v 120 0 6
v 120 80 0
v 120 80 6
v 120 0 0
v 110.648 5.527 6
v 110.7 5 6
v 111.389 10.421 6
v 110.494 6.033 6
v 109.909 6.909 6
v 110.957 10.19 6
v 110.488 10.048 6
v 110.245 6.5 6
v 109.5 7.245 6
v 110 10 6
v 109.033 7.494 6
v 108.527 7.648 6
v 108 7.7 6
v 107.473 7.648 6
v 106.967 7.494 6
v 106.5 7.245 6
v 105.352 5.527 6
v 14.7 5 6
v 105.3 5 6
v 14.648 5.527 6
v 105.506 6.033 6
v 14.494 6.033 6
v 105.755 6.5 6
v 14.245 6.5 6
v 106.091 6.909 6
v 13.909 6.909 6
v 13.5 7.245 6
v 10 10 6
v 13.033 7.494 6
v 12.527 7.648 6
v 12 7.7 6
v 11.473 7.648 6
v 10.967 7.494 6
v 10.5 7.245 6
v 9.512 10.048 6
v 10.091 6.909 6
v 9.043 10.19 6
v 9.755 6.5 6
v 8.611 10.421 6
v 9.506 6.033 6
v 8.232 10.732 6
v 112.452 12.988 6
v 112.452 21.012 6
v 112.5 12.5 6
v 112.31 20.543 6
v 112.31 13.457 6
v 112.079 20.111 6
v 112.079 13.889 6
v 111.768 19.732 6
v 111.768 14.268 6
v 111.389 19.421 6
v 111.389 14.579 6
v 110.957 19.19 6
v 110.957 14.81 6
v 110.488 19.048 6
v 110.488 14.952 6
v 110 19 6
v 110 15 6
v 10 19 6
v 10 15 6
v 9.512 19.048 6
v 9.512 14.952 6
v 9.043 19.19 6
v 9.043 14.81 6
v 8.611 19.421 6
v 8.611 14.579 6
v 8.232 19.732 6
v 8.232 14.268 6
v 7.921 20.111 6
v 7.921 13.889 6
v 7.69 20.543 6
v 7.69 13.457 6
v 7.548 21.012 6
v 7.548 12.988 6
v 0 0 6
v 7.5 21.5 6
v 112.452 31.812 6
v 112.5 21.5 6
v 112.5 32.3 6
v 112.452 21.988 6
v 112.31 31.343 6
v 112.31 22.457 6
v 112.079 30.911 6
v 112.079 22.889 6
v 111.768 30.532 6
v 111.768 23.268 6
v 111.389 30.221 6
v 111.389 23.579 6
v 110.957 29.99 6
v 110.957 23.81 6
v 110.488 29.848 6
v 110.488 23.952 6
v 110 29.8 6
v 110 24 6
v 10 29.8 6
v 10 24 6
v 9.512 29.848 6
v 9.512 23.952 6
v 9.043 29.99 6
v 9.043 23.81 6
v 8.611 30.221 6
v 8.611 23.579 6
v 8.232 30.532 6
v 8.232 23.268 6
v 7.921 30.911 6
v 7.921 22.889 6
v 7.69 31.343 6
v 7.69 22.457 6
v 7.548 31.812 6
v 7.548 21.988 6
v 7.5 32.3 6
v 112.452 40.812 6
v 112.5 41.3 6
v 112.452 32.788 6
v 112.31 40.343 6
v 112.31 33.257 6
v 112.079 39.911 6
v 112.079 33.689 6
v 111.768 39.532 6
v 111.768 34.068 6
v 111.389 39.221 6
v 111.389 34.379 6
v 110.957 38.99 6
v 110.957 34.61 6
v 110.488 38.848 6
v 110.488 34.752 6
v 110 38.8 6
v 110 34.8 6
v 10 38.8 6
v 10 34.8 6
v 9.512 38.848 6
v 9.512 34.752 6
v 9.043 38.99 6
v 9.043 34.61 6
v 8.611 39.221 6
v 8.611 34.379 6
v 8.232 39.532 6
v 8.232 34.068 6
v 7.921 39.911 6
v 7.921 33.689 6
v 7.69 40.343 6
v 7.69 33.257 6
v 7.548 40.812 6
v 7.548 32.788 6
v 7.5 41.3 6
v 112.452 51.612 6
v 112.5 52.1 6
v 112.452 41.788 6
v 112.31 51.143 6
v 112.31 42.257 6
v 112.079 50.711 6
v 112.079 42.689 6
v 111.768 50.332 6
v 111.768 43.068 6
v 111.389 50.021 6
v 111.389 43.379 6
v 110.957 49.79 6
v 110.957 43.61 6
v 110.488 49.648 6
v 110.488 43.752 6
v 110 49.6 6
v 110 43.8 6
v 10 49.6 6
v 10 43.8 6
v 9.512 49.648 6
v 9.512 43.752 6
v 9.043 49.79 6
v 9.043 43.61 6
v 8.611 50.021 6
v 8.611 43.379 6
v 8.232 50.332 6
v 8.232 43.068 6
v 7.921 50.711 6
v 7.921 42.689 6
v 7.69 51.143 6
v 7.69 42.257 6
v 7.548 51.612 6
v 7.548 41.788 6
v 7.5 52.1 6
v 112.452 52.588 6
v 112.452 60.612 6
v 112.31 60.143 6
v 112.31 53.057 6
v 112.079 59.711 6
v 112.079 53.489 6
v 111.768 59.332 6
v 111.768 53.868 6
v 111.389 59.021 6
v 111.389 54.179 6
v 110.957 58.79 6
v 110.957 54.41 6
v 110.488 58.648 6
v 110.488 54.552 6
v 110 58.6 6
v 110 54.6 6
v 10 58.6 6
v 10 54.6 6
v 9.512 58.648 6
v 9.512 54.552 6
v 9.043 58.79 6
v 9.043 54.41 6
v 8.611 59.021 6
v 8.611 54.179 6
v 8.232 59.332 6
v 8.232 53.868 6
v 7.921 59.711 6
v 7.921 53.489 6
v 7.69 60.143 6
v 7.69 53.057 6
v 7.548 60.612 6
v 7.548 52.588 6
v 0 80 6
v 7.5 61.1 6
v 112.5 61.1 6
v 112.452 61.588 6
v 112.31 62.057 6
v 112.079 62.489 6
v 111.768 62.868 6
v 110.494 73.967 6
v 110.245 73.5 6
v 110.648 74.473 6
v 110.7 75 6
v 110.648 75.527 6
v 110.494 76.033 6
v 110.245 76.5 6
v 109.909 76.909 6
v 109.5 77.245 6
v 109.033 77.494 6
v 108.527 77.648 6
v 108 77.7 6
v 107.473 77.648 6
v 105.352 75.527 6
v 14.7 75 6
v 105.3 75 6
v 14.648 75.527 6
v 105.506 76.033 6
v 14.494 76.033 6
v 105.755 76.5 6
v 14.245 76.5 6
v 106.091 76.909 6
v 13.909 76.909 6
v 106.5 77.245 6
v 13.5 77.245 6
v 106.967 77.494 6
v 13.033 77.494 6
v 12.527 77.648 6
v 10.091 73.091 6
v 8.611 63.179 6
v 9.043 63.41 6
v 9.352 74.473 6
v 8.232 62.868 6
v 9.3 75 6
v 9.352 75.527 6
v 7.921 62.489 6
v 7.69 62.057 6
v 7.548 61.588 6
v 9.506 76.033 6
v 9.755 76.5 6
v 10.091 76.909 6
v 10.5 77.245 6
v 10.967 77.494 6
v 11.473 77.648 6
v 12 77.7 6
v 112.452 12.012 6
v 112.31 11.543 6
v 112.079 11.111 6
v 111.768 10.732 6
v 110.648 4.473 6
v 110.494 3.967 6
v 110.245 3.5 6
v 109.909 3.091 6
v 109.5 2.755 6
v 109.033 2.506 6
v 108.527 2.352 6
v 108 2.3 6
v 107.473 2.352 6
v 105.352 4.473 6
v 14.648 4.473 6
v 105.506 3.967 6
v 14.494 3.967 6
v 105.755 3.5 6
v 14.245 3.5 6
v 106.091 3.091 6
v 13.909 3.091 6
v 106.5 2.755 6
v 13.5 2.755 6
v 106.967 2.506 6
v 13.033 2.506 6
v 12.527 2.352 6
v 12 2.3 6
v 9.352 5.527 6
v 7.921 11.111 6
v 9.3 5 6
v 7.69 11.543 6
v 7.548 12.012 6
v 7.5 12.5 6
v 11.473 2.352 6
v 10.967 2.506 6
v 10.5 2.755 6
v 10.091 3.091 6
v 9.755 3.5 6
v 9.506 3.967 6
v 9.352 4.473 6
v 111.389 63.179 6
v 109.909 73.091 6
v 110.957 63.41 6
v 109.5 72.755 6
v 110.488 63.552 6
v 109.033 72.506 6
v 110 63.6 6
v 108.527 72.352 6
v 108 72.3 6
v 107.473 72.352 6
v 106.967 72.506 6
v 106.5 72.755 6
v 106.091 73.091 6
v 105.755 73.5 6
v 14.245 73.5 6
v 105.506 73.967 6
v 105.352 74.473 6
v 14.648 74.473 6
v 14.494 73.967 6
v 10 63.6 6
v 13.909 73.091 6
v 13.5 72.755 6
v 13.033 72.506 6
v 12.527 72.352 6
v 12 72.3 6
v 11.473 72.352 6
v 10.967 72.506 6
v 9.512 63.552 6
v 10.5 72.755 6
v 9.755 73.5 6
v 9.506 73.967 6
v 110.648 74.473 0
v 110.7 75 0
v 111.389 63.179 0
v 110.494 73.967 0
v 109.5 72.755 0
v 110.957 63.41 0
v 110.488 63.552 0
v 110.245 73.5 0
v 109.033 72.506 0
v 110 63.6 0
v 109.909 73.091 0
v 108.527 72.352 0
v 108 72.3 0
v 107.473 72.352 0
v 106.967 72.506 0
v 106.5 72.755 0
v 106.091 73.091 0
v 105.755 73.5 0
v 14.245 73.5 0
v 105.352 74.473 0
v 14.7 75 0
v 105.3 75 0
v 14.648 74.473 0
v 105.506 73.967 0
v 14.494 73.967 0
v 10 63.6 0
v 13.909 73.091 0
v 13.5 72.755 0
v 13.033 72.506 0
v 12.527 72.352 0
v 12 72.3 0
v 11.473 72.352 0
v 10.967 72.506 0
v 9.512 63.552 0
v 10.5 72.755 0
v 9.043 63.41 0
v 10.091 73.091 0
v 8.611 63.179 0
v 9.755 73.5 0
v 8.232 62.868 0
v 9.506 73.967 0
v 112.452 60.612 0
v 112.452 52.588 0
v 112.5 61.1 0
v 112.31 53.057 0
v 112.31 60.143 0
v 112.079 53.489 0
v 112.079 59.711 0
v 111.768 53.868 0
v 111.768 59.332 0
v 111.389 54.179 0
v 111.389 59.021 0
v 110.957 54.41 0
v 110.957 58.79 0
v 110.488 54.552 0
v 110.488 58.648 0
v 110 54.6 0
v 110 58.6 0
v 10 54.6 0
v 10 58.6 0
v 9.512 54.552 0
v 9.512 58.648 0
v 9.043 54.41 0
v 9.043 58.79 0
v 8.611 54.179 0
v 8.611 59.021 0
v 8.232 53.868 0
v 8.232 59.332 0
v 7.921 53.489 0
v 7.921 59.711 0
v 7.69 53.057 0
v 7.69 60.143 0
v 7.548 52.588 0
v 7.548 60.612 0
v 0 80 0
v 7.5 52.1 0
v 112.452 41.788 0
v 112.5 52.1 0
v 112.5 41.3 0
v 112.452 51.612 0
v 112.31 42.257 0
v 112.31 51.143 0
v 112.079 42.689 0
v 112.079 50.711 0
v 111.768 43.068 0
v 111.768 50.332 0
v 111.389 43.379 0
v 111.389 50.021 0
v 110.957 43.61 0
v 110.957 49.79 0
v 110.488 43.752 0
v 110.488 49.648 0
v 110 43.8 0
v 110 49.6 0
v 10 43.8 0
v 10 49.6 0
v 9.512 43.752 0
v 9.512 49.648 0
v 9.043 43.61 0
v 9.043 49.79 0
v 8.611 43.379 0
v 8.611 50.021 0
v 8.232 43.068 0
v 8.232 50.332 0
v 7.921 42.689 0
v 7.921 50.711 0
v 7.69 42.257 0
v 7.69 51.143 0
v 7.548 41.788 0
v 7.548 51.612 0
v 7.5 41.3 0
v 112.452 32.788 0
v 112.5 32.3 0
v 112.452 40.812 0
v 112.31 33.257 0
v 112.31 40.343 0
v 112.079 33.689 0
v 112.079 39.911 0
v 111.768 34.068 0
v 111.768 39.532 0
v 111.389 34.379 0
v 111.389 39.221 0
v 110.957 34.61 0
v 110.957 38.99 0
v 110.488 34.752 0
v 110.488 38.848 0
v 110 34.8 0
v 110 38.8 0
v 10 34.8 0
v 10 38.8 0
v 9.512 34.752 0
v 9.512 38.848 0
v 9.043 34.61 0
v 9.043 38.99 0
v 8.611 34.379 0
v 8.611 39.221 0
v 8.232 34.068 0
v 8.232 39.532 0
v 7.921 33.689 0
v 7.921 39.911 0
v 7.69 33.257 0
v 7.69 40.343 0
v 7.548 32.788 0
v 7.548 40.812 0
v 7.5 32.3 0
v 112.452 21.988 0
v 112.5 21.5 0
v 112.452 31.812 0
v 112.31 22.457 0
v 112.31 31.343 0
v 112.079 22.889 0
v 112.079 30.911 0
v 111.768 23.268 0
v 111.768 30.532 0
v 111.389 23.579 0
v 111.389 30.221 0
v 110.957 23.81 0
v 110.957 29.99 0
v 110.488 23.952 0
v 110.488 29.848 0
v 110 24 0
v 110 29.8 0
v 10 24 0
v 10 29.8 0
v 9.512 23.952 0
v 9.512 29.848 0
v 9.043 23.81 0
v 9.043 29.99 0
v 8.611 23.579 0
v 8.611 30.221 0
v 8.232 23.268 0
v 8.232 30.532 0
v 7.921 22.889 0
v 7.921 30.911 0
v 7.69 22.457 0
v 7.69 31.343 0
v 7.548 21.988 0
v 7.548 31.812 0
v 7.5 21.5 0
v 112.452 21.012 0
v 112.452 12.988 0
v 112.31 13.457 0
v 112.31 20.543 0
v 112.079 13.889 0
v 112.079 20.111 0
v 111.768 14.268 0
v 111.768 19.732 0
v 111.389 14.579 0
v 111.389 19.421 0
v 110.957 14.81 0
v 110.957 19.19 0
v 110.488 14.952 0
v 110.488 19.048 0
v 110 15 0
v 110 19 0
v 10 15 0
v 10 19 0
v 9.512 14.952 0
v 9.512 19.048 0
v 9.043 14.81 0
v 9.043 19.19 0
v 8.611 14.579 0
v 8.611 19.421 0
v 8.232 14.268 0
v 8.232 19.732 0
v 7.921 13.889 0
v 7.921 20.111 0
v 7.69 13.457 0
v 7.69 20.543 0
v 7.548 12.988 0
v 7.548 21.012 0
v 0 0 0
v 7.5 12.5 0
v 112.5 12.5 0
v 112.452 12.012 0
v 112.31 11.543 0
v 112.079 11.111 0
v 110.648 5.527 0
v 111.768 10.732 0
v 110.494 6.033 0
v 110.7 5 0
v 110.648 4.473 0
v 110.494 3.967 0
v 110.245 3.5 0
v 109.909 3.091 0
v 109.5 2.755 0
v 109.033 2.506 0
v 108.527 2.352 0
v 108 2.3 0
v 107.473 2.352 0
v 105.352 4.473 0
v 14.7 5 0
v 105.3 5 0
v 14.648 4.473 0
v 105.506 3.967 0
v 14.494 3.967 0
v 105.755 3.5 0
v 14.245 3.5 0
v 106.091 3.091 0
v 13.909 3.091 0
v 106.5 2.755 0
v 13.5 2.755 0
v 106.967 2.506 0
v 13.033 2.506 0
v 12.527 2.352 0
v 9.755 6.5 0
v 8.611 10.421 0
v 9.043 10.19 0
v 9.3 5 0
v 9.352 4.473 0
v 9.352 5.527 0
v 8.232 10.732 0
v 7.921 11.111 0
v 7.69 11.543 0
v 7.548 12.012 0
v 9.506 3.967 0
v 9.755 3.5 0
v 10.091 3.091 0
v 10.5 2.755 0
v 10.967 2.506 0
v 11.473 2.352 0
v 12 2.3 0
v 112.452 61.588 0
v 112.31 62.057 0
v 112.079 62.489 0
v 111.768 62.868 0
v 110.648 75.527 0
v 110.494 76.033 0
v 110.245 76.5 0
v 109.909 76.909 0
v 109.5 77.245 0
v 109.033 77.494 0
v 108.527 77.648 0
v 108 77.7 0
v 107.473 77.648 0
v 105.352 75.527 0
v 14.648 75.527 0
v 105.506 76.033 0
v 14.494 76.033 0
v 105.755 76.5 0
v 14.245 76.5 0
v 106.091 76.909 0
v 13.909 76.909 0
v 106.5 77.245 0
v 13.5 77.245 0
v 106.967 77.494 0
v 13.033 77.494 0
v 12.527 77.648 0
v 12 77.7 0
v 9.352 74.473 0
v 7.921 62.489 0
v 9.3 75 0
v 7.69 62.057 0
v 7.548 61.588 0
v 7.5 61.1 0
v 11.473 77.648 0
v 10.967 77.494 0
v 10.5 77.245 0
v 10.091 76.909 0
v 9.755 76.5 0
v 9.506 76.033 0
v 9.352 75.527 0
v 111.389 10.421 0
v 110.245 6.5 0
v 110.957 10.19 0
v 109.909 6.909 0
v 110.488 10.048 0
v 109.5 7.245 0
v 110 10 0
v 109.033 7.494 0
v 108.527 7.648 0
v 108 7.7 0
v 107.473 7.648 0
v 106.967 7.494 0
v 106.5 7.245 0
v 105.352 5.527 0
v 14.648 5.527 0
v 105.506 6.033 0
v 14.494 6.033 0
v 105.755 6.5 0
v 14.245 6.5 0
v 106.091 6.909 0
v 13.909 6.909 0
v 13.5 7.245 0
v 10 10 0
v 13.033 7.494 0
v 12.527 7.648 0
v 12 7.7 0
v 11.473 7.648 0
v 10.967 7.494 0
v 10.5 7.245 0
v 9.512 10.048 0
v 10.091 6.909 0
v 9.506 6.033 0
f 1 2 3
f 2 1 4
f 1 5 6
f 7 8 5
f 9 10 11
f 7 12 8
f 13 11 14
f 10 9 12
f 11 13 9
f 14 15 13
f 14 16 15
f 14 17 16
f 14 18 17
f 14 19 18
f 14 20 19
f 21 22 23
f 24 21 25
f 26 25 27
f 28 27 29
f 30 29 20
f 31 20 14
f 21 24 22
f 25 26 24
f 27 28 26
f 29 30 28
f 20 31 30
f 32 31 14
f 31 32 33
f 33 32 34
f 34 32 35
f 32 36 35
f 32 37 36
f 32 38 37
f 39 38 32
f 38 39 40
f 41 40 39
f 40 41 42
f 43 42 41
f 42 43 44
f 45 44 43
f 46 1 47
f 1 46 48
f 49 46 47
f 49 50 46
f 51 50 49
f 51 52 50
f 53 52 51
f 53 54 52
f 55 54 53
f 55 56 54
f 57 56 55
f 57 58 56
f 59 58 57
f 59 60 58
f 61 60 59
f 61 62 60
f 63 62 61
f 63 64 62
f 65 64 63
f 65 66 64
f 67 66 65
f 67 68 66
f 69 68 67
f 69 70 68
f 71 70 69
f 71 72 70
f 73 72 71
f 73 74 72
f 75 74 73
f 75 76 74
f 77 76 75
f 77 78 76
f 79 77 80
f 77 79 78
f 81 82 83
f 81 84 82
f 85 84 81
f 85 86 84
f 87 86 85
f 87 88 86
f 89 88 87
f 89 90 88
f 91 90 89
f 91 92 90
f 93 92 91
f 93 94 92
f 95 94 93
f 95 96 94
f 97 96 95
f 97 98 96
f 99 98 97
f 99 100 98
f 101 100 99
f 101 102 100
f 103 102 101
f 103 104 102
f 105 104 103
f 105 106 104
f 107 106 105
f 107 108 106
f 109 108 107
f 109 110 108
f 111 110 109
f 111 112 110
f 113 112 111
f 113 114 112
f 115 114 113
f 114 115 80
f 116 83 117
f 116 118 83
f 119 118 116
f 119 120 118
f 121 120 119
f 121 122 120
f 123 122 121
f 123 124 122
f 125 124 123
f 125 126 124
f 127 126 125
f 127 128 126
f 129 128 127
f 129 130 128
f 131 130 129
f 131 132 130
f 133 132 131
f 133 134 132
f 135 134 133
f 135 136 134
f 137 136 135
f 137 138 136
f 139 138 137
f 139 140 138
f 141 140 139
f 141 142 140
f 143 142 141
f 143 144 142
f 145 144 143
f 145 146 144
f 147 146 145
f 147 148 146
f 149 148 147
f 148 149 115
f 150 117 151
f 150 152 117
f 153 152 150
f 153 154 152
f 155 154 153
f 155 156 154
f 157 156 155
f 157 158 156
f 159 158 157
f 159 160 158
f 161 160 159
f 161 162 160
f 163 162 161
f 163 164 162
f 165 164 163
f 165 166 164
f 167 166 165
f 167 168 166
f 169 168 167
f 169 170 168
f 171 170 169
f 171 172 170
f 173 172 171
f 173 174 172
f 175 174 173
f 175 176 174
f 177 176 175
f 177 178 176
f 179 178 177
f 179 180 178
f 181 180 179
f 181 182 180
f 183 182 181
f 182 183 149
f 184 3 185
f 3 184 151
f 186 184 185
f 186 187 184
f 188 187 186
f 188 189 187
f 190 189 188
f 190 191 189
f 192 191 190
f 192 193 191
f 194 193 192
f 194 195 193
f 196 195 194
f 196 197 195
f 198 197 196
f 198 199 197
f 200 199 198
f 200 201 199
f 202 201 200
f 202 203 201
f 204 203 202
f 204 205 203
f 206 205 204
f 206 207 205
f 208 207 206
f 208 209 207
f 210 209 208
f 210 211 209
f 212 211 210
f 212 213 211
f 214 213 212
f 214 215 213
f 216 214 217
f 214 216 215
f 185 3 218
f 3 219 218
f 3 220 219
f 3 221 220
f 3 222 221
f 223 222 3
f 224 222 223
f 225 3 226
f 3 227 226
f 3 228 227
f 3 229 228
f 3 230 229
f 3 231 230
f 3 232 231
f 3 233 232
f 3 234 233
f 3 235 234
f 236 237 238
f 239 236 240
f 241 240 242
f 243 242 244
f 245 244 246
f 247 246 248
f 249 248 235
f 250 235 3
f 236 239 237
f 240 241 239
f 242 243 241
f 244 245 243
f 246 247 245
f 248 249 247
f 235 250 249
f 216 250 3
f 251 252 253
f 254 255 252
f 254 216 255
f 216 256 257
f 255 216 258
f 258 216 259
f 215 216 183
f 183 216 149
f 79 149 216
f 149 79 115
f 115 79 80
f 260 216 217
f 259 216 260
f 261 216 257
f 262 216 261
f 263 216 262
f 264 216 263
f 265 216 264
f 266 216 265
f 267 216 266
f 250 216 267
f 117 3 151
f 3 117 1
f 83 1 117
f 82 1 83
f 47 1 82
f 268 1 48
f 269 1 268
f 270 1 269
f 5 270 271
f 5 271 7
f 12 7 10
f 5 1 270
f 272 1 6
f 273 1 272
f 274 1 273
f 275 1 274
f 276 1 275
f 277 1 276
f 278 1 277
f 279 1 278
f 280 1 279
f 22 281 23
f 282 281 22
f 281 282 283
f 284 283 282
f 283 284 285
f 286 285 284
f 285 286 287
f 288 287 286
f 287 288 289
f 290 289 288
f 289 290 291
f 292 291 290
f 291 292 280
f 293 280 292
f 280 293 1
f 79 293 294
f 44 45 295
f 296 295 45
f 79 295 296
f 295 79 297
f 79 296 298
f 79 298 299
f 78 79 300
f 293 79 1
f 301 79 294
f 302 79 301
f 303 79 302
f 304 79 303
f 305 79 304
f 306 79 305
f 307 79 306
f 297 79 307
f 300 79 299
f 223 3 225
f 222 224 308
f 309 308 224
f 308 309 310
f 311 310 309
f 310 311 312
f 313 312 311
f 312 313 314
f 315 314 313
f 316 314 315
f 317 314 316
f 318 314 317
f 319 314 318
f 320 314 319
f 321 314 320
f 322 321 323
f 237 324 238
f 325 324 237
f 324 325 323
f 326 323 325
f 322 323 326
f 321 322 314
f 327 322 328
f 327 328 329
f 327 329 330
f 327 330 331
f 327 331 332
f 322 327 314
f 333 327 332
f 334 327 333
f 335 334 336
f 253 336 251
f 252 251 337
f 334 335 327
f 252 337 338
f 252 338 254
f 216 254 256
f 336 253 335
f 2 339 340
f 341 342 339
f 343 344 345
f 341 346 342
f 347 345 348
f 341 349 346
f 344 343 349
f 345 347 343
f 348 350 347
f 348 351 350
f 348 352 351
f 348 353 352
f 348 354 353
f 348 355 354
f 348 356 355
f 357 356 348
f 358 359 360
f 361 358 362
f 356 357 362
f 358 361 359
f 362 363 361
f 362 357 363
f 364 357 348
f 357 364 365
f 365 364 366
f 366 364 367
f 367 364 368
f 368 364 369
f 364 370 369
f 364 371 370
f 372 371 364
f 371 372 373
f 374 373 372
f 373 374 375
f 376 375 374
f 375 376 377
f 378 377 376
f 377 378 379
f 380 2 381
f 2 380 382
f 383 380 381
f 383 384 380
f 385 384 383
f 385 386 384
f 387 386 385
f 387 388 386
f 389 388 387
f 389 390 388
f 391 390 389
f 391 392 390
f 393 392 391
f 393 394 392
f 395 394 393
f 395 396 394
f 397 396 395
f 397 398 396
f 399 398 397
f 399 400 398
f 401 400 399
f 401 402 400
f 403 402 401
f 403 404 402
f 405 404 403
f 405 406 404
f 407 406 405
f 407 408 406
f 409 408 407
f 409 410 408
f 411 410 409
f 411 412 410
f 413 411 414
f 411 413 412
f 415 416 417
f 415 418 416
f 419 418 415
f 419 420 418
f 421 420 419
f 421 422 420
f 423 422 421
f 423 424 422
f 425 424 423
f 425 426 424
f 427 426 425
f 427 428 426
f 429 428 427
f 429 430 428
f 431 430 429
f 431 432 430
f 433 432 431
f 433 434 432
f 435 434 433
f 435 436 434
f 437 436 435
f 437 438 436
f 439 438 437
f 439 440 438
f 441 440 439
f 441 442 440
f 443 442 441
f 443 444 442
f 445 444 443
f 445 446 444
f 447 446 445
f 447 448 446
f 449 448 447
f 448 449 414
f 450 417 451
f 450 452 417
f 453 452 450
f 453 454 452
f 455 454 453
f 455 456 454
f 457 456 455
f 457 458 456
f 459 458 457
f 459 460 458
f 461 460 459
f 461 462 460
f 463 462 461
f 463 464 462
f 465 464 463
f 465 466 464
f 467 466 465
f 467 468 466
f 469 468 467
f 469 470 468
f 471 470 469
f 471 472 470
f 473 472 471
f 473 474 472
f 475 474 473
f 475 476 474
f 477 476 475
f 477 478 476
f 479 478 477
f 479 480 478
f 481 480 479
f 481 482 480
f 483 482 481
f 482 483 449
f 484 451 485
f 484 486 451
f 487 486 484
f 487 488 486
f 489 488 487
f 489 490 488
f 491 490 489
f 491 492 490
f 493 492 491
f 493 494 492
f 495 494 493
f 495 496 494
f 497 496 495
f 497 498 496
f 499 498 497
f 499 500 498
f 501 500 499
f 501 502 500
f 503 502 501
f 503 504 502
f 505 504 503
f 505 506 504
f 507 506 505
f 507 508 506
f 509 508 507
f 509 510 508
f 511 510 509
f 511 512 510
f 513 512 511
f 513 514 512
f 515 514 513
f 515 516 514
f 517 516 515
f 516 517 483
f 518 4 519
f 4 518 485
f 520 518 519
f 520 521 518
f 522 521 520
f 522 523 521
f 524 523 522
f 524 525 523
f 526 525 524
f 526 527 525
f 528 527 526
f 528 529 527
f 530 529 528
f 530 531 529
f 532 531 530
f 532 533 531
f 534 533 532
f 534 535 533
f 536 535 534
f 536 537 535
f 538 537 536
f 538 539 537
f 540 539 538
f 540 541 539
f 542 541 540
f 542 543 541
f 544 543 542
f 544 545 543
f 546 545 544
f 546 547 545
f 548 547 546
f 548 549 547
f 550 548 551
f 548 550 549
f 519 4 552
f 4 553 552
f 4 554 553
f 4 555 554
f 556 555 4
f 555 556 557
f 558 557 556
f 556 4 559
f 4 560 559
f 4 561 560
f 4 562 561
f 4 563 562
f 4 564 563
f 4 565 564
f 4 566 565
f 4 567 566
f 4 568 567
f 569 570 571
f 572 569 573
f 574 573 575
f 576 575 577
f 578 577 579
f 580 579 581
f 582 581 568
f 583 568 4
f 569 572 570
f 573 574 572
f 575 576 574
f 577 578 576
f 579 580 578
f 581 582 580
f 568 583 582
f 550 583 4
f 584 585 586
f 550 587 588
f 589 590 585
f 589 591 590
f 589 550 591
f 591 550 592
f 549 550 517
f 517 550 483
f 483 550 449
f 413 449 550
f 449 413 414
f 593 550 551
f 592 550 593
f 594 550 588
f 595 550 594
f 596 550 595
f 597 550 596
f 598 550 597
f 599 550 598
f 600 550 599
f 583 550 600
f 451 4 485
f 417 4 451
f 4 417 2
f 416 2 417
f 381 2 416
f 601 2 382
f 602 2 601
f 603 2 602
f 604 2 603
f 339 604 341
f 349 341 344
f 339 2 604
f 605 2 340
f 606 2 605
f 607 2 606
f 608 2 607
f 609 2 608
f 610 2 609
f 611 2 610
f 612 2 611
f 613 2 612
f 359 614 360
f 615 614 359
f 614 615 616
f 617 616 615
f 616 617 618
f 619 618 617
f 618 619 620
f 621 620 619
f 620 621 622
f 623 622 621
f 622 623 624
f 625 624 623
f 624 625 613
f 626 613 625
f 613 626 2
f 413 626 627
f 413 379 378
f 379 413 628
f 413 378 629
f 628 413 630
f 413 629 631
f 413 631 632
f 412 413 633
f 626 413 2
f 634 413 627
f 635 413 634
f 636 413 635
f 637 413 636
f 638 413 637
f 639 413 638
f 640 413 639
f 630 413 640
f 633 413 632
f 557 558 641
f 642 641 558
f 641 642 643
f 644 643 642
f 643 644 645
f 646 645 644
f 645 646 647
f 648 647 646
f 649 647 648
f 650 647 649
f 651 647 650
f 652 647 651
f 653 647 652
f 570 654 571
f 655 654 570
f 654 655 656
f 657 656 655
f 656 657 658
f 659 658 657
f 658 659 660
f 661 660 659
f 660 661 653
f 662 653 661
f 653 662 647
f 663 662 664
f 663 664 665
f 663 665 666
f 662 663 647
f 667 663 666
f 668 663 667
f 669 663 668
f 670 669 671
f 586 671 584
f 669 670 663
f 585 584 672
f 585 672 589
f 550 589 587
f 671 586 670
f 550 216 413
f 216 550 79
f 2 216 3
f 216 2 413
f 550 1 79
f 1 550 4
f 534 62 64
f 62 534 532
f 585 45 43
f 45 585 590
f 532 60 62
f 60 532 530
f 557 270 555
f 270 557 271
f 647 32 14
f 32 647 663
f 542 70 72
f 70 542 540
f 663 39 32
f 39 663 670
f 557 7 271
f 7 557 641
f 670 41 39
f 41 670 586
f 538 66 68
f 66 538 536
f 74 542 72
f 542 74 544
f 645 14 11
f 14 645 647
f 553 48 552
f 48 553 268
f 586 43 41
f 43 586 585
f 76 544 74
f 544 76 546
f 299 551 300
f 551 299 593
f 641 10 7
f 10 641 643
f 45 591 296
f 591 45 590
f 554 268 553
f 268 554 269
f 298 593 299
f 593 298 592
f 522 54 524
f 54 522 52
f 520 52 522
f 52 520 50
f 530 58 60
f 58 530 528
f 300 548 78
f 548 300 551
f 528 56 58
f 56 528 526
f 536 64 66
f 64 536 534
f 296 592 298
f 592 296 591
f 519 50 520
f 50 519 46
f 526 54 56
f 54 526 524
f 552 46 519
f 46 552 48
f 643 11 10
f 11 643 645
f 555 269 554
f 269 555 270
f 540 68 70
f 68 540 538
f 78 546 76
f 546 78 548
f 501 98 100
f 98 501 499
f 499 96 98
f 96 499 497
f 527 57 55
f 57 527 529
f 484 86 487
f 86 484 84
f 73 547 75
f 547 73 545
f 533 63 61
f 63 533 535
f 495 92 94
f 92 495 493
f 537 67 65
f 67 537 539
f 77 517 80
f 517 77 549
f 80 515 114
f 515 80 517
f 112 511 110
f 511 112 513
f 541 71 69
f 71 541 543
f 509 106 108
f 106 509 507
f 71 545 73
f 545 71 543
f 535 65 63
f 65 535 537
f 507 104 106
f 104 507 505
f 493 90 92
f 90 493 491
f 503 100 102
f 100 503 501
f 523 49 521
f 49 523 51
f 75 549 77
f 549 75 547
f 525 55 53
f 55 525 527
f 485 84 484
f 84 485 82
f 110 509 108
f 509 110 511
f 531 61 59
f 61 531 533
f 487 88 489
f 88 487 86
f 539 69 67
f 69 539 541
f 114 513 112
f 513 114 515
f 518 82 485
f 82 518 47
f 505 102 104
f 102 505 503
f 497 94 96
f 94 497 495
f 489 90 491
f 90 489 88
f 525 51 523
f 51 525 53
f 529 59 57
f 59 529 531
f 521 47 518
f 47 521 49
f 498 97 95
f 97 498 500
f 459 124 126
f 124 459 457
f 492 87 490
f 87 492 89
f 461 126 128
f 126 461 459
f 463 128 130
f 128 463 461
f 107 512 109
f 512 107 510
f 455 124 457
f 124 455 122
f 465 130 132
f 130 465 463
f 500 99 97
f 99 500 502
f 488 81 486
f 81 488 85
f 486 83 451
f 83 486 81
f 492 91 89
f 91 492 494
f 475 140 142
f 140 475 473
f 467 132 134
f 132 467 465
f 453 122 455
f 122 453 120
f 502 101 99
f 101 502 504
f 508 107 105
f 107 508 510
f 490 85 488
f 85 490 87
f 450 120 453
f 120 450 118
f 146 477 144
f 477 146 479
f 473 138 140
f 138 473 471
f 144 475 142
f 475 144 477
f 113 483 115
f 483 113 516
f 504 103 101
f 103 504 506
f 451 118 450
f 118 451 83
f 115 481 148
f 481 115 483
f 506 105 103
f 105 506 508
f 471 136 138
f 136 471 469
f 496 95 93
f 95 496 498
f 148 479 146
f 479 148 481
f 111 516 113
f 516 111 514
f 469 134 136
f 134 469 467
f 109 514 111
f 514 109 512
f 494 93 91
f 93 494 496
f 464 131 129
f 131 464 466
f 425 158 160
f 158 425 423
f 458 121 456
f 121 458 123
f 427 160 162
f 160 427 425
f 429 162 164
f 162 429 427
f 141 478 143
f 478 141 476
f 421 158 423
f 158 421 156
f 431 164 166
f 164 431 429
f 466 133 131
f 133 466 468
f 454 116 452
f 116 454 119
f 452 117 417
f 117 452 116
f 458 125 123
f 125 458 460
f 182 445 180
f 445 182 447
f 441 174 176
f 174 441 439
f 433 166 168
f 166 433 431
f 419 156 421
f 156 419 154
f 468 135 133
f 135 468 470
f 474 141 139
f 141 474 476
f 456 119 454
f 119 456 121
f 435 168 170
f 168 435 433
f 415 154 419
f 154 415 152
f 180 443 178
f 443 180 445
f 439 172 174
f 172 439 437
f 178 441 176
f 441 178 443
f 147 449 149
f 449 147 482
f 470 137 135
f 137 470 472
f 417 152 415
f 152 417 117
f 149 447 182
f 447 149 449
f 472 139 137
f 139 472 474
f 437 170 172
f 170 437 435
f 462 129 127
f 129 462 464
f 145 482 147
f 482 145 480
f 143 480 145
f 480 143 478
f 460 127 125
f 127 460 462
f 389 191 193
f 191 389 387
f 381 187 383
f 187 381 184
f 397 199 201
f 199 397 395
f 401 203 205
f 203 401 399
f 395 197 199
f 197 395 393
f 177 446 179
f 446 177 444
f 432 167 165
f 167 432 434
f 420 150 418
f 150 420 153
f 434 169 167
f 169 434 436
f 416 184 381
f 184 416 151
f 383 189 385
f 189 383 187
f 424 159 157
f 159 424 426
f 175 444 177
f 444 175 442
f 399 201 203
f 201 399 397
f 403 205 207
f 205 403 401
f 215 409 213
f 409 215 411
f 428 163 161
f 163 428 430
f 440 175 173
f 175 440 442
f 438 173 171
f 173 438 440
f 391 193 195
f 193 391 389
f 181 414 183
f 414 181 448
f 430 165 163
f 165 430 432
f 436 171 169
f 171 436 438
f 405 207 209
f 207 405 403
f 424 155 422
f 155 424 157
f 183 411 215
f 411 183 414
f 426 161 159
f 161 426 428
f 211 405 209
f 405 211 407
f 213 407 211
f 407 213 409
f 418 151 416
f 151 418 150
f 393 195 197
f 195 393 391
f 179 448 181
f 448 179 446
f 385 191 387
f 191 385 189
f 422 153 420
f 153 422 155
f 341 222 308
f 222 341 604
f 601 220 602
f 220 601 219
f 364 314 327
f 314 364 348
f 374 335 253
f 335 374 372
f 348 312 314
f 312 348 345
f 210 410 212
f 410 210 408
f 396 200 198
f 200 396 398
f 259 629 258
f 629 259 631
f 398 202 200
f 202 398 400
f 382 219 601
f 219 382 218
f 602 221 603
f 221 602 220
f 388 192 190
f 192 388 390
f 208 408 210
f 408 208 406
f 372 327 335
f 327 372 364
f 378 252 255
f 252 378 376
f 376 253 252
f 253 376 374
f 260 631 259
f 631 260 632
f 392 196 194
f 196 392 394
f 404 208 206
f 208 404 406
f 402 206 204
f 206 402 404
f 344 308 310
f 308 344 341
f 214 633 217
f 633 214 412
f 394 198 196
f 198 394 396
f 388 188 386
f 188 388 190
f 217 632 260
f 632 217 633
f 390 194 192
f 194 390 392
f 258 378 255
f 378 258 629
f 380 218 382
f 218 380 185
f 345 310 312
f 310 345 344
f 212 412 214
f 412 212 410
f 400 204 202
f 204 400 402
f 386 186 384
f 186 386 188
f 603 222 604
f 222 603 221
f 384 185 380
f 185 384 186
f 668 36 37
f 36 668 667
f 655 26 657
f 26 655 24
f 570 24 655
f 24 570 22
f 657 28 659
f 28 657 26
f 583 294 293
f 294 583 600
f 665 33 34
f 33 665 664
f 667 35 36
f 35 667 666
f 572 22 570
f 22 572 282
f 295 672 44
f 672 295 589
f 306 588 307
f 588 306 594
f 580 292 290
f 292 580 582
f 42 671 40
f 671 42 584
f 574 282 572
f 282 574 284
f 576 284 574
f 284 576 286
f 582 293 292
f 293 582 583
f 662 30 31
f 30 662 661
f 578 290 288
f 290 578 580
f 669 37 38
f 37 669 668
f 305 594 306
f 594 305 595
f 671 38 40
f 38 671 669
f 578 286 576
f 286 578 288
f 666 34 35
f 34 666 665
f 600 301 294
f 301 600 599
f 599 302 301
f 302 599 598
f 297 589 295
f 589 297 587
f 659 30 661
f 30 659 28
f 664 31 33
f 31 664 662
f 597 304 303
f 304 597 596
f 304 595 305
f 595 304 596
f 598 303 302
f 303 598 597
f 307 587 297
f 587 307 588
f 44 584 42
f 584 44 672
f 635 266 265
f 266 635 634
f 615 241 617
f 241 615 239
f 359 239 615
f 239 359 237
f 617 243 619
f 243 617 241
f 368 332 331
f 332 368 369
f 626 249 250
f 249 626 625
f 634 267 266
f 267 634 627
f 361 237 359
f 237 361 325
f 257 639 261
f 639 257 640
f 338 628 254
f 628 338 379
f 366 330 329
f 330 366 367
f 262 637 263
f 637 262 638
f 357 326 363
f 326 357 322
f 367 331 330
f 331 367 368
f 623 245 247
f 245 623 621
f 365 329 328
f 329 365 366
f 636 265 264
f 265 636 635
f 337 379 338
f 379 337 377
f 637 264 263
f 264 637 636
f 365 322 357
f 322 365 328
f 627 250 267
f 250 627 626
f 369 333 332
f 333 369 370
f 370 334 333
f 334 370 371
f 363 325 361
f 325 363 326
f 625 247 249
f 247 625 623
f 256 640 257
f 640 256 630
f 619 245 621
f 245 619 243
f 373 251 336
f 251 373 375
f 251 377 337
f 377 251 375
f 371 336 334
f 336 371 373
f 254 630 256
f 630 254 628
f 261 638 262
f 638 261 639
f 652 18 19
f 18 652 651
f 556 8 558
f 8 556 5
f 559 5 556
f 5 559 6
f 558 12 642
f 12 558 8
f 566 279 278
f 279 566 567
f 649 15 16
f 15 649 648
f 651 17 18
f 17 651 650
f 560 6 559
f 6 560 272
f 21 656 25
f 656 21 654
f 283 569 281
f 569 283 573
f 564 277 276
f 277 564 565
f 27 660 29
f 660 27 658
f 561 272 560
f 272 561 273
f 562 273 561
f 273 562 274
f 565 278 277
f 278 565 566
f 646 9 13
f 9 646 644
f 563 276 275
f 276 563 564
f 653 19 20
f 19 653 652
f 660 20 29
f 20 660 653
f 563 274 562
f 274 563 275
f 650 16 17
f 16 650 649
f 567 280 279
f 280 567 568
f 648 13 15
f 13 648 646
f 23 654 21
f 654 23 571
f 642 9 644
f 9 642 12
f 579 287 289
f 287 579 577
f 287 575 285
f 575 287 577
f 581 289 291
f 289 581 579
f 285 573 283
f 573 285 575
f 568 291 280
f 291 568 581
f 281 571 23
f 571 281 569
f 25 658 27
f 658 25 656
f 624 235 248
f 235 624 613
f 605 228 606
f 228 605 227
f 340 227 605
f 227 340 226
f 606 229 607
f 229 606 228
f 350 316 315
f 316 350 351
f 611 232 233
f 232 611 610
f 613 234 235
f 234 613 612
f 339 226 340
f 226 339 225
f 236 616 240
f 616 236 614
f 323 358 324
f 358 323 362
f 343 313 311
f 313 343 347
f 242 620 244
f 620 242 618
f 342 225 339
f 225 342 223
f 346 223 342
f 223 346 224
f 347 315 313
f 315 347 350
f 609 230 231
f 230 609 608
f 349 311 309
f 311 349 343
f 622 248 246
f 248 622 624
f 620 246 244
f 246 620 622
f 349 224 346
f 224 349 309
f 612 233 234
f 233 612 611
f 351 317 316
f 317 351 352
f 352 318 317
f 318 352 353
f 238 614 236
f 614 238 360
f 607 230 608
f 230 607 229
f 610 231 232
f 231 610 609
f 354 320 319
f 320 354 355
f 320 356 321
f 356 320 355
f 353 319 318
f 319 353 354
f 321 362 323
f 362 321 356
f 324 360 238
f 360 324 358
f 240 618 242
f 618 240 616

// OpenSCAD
$fn = 32;

// ----------------------------------------------------------------------
// Slotted panel: 120 x 80 mm, 6 рядов of slots
// ----------------------------------------------------------------------

// --- parameters (mm) ---
panel_w = 120;            // panel width
panel_d = 80;             // panel depth
thick = 6;                // panel thickness
slot_w = 5;               // slot width
pitch0 = 9;               // first row pitch
pitch_step = 1.8;         // pitch increase per row
margin = 10;              // margin around the slot field
rows = 6;                 // number of slot rows
mount_d = 5.4;            // mounting holes
mount_x = 48;             // mounting hole offset

difference() {
  union() {
    cube([panel_w, panel_d, thick]);
  }
  /* slot rows: stadium shaped cutters, 2.5 mm clear of both faces */
  /* row 0: pitch 9, length 100 */
  hull() {
    translate([10, 12.5, -2.5]) cylinder(h = thick + 5, d = slot_w);
    translate([110, 12.5, -2.5]) cylinder(h = thick + 5, d = slot_w);
  }
  /* row 1: pitch 10.8, length 100 */
  hull() {
    translate([10, 21.5, -2.5]) cylinder(h = thick + 5, d = slot_w);
    translate([110, 21.5, -2.5]) cylinder(h = thick + 5, d = slot_w);
  }
  /* row 2: pitch 9, length 100 */
  hull() {
    translate([10, 32.3, -2.5]) cylinder(h = thick + 5, d = slot_w);
    translate([110, 32.3, -2.5]) cylinder(h = thick + 5, d = slot_w);
  }
  /* row 3: pitch 10.8, length 100 */
  hull() {
    translate([10, 41.3, -2.5]) cylinder(h = thick + 5, d = slot_w);
    translate([110, 41.3, -2.5]) cylinder(h = thick + 5, d = slot_w);
  }
  /* row 4: pitch 9, length 100 */
  hull() {
    translate([10, 52.1, -2.5]) cylinder(h = thick + 5, d = slot_w);
    translate([110, 52.1, -2.5]) cylinder(h = thick + 5, d = slot_w);
  }
  /* row 5: pitch 10.8, length 100 */
  hull() {
    translate([10, 61.1, -2.5]) cylinder(h = thick + 5, d = slot_w);
    translate([110, 61.1, -2.5]) cylinder(h = thick + 5, d = slot_w);
  }
  translate([12, 5, -2.5]) cylinder(h = 11, d = mount_d);
  translate([12, 75, -2.5]) cylinder(h = 11, d = mount_d);
  translate([108, 5, -2.5]) cylinder(h = 11, d = mount_d);
  translate([108, 75, -2.5]) cylinder(h = 11, d = mount_d);
}
